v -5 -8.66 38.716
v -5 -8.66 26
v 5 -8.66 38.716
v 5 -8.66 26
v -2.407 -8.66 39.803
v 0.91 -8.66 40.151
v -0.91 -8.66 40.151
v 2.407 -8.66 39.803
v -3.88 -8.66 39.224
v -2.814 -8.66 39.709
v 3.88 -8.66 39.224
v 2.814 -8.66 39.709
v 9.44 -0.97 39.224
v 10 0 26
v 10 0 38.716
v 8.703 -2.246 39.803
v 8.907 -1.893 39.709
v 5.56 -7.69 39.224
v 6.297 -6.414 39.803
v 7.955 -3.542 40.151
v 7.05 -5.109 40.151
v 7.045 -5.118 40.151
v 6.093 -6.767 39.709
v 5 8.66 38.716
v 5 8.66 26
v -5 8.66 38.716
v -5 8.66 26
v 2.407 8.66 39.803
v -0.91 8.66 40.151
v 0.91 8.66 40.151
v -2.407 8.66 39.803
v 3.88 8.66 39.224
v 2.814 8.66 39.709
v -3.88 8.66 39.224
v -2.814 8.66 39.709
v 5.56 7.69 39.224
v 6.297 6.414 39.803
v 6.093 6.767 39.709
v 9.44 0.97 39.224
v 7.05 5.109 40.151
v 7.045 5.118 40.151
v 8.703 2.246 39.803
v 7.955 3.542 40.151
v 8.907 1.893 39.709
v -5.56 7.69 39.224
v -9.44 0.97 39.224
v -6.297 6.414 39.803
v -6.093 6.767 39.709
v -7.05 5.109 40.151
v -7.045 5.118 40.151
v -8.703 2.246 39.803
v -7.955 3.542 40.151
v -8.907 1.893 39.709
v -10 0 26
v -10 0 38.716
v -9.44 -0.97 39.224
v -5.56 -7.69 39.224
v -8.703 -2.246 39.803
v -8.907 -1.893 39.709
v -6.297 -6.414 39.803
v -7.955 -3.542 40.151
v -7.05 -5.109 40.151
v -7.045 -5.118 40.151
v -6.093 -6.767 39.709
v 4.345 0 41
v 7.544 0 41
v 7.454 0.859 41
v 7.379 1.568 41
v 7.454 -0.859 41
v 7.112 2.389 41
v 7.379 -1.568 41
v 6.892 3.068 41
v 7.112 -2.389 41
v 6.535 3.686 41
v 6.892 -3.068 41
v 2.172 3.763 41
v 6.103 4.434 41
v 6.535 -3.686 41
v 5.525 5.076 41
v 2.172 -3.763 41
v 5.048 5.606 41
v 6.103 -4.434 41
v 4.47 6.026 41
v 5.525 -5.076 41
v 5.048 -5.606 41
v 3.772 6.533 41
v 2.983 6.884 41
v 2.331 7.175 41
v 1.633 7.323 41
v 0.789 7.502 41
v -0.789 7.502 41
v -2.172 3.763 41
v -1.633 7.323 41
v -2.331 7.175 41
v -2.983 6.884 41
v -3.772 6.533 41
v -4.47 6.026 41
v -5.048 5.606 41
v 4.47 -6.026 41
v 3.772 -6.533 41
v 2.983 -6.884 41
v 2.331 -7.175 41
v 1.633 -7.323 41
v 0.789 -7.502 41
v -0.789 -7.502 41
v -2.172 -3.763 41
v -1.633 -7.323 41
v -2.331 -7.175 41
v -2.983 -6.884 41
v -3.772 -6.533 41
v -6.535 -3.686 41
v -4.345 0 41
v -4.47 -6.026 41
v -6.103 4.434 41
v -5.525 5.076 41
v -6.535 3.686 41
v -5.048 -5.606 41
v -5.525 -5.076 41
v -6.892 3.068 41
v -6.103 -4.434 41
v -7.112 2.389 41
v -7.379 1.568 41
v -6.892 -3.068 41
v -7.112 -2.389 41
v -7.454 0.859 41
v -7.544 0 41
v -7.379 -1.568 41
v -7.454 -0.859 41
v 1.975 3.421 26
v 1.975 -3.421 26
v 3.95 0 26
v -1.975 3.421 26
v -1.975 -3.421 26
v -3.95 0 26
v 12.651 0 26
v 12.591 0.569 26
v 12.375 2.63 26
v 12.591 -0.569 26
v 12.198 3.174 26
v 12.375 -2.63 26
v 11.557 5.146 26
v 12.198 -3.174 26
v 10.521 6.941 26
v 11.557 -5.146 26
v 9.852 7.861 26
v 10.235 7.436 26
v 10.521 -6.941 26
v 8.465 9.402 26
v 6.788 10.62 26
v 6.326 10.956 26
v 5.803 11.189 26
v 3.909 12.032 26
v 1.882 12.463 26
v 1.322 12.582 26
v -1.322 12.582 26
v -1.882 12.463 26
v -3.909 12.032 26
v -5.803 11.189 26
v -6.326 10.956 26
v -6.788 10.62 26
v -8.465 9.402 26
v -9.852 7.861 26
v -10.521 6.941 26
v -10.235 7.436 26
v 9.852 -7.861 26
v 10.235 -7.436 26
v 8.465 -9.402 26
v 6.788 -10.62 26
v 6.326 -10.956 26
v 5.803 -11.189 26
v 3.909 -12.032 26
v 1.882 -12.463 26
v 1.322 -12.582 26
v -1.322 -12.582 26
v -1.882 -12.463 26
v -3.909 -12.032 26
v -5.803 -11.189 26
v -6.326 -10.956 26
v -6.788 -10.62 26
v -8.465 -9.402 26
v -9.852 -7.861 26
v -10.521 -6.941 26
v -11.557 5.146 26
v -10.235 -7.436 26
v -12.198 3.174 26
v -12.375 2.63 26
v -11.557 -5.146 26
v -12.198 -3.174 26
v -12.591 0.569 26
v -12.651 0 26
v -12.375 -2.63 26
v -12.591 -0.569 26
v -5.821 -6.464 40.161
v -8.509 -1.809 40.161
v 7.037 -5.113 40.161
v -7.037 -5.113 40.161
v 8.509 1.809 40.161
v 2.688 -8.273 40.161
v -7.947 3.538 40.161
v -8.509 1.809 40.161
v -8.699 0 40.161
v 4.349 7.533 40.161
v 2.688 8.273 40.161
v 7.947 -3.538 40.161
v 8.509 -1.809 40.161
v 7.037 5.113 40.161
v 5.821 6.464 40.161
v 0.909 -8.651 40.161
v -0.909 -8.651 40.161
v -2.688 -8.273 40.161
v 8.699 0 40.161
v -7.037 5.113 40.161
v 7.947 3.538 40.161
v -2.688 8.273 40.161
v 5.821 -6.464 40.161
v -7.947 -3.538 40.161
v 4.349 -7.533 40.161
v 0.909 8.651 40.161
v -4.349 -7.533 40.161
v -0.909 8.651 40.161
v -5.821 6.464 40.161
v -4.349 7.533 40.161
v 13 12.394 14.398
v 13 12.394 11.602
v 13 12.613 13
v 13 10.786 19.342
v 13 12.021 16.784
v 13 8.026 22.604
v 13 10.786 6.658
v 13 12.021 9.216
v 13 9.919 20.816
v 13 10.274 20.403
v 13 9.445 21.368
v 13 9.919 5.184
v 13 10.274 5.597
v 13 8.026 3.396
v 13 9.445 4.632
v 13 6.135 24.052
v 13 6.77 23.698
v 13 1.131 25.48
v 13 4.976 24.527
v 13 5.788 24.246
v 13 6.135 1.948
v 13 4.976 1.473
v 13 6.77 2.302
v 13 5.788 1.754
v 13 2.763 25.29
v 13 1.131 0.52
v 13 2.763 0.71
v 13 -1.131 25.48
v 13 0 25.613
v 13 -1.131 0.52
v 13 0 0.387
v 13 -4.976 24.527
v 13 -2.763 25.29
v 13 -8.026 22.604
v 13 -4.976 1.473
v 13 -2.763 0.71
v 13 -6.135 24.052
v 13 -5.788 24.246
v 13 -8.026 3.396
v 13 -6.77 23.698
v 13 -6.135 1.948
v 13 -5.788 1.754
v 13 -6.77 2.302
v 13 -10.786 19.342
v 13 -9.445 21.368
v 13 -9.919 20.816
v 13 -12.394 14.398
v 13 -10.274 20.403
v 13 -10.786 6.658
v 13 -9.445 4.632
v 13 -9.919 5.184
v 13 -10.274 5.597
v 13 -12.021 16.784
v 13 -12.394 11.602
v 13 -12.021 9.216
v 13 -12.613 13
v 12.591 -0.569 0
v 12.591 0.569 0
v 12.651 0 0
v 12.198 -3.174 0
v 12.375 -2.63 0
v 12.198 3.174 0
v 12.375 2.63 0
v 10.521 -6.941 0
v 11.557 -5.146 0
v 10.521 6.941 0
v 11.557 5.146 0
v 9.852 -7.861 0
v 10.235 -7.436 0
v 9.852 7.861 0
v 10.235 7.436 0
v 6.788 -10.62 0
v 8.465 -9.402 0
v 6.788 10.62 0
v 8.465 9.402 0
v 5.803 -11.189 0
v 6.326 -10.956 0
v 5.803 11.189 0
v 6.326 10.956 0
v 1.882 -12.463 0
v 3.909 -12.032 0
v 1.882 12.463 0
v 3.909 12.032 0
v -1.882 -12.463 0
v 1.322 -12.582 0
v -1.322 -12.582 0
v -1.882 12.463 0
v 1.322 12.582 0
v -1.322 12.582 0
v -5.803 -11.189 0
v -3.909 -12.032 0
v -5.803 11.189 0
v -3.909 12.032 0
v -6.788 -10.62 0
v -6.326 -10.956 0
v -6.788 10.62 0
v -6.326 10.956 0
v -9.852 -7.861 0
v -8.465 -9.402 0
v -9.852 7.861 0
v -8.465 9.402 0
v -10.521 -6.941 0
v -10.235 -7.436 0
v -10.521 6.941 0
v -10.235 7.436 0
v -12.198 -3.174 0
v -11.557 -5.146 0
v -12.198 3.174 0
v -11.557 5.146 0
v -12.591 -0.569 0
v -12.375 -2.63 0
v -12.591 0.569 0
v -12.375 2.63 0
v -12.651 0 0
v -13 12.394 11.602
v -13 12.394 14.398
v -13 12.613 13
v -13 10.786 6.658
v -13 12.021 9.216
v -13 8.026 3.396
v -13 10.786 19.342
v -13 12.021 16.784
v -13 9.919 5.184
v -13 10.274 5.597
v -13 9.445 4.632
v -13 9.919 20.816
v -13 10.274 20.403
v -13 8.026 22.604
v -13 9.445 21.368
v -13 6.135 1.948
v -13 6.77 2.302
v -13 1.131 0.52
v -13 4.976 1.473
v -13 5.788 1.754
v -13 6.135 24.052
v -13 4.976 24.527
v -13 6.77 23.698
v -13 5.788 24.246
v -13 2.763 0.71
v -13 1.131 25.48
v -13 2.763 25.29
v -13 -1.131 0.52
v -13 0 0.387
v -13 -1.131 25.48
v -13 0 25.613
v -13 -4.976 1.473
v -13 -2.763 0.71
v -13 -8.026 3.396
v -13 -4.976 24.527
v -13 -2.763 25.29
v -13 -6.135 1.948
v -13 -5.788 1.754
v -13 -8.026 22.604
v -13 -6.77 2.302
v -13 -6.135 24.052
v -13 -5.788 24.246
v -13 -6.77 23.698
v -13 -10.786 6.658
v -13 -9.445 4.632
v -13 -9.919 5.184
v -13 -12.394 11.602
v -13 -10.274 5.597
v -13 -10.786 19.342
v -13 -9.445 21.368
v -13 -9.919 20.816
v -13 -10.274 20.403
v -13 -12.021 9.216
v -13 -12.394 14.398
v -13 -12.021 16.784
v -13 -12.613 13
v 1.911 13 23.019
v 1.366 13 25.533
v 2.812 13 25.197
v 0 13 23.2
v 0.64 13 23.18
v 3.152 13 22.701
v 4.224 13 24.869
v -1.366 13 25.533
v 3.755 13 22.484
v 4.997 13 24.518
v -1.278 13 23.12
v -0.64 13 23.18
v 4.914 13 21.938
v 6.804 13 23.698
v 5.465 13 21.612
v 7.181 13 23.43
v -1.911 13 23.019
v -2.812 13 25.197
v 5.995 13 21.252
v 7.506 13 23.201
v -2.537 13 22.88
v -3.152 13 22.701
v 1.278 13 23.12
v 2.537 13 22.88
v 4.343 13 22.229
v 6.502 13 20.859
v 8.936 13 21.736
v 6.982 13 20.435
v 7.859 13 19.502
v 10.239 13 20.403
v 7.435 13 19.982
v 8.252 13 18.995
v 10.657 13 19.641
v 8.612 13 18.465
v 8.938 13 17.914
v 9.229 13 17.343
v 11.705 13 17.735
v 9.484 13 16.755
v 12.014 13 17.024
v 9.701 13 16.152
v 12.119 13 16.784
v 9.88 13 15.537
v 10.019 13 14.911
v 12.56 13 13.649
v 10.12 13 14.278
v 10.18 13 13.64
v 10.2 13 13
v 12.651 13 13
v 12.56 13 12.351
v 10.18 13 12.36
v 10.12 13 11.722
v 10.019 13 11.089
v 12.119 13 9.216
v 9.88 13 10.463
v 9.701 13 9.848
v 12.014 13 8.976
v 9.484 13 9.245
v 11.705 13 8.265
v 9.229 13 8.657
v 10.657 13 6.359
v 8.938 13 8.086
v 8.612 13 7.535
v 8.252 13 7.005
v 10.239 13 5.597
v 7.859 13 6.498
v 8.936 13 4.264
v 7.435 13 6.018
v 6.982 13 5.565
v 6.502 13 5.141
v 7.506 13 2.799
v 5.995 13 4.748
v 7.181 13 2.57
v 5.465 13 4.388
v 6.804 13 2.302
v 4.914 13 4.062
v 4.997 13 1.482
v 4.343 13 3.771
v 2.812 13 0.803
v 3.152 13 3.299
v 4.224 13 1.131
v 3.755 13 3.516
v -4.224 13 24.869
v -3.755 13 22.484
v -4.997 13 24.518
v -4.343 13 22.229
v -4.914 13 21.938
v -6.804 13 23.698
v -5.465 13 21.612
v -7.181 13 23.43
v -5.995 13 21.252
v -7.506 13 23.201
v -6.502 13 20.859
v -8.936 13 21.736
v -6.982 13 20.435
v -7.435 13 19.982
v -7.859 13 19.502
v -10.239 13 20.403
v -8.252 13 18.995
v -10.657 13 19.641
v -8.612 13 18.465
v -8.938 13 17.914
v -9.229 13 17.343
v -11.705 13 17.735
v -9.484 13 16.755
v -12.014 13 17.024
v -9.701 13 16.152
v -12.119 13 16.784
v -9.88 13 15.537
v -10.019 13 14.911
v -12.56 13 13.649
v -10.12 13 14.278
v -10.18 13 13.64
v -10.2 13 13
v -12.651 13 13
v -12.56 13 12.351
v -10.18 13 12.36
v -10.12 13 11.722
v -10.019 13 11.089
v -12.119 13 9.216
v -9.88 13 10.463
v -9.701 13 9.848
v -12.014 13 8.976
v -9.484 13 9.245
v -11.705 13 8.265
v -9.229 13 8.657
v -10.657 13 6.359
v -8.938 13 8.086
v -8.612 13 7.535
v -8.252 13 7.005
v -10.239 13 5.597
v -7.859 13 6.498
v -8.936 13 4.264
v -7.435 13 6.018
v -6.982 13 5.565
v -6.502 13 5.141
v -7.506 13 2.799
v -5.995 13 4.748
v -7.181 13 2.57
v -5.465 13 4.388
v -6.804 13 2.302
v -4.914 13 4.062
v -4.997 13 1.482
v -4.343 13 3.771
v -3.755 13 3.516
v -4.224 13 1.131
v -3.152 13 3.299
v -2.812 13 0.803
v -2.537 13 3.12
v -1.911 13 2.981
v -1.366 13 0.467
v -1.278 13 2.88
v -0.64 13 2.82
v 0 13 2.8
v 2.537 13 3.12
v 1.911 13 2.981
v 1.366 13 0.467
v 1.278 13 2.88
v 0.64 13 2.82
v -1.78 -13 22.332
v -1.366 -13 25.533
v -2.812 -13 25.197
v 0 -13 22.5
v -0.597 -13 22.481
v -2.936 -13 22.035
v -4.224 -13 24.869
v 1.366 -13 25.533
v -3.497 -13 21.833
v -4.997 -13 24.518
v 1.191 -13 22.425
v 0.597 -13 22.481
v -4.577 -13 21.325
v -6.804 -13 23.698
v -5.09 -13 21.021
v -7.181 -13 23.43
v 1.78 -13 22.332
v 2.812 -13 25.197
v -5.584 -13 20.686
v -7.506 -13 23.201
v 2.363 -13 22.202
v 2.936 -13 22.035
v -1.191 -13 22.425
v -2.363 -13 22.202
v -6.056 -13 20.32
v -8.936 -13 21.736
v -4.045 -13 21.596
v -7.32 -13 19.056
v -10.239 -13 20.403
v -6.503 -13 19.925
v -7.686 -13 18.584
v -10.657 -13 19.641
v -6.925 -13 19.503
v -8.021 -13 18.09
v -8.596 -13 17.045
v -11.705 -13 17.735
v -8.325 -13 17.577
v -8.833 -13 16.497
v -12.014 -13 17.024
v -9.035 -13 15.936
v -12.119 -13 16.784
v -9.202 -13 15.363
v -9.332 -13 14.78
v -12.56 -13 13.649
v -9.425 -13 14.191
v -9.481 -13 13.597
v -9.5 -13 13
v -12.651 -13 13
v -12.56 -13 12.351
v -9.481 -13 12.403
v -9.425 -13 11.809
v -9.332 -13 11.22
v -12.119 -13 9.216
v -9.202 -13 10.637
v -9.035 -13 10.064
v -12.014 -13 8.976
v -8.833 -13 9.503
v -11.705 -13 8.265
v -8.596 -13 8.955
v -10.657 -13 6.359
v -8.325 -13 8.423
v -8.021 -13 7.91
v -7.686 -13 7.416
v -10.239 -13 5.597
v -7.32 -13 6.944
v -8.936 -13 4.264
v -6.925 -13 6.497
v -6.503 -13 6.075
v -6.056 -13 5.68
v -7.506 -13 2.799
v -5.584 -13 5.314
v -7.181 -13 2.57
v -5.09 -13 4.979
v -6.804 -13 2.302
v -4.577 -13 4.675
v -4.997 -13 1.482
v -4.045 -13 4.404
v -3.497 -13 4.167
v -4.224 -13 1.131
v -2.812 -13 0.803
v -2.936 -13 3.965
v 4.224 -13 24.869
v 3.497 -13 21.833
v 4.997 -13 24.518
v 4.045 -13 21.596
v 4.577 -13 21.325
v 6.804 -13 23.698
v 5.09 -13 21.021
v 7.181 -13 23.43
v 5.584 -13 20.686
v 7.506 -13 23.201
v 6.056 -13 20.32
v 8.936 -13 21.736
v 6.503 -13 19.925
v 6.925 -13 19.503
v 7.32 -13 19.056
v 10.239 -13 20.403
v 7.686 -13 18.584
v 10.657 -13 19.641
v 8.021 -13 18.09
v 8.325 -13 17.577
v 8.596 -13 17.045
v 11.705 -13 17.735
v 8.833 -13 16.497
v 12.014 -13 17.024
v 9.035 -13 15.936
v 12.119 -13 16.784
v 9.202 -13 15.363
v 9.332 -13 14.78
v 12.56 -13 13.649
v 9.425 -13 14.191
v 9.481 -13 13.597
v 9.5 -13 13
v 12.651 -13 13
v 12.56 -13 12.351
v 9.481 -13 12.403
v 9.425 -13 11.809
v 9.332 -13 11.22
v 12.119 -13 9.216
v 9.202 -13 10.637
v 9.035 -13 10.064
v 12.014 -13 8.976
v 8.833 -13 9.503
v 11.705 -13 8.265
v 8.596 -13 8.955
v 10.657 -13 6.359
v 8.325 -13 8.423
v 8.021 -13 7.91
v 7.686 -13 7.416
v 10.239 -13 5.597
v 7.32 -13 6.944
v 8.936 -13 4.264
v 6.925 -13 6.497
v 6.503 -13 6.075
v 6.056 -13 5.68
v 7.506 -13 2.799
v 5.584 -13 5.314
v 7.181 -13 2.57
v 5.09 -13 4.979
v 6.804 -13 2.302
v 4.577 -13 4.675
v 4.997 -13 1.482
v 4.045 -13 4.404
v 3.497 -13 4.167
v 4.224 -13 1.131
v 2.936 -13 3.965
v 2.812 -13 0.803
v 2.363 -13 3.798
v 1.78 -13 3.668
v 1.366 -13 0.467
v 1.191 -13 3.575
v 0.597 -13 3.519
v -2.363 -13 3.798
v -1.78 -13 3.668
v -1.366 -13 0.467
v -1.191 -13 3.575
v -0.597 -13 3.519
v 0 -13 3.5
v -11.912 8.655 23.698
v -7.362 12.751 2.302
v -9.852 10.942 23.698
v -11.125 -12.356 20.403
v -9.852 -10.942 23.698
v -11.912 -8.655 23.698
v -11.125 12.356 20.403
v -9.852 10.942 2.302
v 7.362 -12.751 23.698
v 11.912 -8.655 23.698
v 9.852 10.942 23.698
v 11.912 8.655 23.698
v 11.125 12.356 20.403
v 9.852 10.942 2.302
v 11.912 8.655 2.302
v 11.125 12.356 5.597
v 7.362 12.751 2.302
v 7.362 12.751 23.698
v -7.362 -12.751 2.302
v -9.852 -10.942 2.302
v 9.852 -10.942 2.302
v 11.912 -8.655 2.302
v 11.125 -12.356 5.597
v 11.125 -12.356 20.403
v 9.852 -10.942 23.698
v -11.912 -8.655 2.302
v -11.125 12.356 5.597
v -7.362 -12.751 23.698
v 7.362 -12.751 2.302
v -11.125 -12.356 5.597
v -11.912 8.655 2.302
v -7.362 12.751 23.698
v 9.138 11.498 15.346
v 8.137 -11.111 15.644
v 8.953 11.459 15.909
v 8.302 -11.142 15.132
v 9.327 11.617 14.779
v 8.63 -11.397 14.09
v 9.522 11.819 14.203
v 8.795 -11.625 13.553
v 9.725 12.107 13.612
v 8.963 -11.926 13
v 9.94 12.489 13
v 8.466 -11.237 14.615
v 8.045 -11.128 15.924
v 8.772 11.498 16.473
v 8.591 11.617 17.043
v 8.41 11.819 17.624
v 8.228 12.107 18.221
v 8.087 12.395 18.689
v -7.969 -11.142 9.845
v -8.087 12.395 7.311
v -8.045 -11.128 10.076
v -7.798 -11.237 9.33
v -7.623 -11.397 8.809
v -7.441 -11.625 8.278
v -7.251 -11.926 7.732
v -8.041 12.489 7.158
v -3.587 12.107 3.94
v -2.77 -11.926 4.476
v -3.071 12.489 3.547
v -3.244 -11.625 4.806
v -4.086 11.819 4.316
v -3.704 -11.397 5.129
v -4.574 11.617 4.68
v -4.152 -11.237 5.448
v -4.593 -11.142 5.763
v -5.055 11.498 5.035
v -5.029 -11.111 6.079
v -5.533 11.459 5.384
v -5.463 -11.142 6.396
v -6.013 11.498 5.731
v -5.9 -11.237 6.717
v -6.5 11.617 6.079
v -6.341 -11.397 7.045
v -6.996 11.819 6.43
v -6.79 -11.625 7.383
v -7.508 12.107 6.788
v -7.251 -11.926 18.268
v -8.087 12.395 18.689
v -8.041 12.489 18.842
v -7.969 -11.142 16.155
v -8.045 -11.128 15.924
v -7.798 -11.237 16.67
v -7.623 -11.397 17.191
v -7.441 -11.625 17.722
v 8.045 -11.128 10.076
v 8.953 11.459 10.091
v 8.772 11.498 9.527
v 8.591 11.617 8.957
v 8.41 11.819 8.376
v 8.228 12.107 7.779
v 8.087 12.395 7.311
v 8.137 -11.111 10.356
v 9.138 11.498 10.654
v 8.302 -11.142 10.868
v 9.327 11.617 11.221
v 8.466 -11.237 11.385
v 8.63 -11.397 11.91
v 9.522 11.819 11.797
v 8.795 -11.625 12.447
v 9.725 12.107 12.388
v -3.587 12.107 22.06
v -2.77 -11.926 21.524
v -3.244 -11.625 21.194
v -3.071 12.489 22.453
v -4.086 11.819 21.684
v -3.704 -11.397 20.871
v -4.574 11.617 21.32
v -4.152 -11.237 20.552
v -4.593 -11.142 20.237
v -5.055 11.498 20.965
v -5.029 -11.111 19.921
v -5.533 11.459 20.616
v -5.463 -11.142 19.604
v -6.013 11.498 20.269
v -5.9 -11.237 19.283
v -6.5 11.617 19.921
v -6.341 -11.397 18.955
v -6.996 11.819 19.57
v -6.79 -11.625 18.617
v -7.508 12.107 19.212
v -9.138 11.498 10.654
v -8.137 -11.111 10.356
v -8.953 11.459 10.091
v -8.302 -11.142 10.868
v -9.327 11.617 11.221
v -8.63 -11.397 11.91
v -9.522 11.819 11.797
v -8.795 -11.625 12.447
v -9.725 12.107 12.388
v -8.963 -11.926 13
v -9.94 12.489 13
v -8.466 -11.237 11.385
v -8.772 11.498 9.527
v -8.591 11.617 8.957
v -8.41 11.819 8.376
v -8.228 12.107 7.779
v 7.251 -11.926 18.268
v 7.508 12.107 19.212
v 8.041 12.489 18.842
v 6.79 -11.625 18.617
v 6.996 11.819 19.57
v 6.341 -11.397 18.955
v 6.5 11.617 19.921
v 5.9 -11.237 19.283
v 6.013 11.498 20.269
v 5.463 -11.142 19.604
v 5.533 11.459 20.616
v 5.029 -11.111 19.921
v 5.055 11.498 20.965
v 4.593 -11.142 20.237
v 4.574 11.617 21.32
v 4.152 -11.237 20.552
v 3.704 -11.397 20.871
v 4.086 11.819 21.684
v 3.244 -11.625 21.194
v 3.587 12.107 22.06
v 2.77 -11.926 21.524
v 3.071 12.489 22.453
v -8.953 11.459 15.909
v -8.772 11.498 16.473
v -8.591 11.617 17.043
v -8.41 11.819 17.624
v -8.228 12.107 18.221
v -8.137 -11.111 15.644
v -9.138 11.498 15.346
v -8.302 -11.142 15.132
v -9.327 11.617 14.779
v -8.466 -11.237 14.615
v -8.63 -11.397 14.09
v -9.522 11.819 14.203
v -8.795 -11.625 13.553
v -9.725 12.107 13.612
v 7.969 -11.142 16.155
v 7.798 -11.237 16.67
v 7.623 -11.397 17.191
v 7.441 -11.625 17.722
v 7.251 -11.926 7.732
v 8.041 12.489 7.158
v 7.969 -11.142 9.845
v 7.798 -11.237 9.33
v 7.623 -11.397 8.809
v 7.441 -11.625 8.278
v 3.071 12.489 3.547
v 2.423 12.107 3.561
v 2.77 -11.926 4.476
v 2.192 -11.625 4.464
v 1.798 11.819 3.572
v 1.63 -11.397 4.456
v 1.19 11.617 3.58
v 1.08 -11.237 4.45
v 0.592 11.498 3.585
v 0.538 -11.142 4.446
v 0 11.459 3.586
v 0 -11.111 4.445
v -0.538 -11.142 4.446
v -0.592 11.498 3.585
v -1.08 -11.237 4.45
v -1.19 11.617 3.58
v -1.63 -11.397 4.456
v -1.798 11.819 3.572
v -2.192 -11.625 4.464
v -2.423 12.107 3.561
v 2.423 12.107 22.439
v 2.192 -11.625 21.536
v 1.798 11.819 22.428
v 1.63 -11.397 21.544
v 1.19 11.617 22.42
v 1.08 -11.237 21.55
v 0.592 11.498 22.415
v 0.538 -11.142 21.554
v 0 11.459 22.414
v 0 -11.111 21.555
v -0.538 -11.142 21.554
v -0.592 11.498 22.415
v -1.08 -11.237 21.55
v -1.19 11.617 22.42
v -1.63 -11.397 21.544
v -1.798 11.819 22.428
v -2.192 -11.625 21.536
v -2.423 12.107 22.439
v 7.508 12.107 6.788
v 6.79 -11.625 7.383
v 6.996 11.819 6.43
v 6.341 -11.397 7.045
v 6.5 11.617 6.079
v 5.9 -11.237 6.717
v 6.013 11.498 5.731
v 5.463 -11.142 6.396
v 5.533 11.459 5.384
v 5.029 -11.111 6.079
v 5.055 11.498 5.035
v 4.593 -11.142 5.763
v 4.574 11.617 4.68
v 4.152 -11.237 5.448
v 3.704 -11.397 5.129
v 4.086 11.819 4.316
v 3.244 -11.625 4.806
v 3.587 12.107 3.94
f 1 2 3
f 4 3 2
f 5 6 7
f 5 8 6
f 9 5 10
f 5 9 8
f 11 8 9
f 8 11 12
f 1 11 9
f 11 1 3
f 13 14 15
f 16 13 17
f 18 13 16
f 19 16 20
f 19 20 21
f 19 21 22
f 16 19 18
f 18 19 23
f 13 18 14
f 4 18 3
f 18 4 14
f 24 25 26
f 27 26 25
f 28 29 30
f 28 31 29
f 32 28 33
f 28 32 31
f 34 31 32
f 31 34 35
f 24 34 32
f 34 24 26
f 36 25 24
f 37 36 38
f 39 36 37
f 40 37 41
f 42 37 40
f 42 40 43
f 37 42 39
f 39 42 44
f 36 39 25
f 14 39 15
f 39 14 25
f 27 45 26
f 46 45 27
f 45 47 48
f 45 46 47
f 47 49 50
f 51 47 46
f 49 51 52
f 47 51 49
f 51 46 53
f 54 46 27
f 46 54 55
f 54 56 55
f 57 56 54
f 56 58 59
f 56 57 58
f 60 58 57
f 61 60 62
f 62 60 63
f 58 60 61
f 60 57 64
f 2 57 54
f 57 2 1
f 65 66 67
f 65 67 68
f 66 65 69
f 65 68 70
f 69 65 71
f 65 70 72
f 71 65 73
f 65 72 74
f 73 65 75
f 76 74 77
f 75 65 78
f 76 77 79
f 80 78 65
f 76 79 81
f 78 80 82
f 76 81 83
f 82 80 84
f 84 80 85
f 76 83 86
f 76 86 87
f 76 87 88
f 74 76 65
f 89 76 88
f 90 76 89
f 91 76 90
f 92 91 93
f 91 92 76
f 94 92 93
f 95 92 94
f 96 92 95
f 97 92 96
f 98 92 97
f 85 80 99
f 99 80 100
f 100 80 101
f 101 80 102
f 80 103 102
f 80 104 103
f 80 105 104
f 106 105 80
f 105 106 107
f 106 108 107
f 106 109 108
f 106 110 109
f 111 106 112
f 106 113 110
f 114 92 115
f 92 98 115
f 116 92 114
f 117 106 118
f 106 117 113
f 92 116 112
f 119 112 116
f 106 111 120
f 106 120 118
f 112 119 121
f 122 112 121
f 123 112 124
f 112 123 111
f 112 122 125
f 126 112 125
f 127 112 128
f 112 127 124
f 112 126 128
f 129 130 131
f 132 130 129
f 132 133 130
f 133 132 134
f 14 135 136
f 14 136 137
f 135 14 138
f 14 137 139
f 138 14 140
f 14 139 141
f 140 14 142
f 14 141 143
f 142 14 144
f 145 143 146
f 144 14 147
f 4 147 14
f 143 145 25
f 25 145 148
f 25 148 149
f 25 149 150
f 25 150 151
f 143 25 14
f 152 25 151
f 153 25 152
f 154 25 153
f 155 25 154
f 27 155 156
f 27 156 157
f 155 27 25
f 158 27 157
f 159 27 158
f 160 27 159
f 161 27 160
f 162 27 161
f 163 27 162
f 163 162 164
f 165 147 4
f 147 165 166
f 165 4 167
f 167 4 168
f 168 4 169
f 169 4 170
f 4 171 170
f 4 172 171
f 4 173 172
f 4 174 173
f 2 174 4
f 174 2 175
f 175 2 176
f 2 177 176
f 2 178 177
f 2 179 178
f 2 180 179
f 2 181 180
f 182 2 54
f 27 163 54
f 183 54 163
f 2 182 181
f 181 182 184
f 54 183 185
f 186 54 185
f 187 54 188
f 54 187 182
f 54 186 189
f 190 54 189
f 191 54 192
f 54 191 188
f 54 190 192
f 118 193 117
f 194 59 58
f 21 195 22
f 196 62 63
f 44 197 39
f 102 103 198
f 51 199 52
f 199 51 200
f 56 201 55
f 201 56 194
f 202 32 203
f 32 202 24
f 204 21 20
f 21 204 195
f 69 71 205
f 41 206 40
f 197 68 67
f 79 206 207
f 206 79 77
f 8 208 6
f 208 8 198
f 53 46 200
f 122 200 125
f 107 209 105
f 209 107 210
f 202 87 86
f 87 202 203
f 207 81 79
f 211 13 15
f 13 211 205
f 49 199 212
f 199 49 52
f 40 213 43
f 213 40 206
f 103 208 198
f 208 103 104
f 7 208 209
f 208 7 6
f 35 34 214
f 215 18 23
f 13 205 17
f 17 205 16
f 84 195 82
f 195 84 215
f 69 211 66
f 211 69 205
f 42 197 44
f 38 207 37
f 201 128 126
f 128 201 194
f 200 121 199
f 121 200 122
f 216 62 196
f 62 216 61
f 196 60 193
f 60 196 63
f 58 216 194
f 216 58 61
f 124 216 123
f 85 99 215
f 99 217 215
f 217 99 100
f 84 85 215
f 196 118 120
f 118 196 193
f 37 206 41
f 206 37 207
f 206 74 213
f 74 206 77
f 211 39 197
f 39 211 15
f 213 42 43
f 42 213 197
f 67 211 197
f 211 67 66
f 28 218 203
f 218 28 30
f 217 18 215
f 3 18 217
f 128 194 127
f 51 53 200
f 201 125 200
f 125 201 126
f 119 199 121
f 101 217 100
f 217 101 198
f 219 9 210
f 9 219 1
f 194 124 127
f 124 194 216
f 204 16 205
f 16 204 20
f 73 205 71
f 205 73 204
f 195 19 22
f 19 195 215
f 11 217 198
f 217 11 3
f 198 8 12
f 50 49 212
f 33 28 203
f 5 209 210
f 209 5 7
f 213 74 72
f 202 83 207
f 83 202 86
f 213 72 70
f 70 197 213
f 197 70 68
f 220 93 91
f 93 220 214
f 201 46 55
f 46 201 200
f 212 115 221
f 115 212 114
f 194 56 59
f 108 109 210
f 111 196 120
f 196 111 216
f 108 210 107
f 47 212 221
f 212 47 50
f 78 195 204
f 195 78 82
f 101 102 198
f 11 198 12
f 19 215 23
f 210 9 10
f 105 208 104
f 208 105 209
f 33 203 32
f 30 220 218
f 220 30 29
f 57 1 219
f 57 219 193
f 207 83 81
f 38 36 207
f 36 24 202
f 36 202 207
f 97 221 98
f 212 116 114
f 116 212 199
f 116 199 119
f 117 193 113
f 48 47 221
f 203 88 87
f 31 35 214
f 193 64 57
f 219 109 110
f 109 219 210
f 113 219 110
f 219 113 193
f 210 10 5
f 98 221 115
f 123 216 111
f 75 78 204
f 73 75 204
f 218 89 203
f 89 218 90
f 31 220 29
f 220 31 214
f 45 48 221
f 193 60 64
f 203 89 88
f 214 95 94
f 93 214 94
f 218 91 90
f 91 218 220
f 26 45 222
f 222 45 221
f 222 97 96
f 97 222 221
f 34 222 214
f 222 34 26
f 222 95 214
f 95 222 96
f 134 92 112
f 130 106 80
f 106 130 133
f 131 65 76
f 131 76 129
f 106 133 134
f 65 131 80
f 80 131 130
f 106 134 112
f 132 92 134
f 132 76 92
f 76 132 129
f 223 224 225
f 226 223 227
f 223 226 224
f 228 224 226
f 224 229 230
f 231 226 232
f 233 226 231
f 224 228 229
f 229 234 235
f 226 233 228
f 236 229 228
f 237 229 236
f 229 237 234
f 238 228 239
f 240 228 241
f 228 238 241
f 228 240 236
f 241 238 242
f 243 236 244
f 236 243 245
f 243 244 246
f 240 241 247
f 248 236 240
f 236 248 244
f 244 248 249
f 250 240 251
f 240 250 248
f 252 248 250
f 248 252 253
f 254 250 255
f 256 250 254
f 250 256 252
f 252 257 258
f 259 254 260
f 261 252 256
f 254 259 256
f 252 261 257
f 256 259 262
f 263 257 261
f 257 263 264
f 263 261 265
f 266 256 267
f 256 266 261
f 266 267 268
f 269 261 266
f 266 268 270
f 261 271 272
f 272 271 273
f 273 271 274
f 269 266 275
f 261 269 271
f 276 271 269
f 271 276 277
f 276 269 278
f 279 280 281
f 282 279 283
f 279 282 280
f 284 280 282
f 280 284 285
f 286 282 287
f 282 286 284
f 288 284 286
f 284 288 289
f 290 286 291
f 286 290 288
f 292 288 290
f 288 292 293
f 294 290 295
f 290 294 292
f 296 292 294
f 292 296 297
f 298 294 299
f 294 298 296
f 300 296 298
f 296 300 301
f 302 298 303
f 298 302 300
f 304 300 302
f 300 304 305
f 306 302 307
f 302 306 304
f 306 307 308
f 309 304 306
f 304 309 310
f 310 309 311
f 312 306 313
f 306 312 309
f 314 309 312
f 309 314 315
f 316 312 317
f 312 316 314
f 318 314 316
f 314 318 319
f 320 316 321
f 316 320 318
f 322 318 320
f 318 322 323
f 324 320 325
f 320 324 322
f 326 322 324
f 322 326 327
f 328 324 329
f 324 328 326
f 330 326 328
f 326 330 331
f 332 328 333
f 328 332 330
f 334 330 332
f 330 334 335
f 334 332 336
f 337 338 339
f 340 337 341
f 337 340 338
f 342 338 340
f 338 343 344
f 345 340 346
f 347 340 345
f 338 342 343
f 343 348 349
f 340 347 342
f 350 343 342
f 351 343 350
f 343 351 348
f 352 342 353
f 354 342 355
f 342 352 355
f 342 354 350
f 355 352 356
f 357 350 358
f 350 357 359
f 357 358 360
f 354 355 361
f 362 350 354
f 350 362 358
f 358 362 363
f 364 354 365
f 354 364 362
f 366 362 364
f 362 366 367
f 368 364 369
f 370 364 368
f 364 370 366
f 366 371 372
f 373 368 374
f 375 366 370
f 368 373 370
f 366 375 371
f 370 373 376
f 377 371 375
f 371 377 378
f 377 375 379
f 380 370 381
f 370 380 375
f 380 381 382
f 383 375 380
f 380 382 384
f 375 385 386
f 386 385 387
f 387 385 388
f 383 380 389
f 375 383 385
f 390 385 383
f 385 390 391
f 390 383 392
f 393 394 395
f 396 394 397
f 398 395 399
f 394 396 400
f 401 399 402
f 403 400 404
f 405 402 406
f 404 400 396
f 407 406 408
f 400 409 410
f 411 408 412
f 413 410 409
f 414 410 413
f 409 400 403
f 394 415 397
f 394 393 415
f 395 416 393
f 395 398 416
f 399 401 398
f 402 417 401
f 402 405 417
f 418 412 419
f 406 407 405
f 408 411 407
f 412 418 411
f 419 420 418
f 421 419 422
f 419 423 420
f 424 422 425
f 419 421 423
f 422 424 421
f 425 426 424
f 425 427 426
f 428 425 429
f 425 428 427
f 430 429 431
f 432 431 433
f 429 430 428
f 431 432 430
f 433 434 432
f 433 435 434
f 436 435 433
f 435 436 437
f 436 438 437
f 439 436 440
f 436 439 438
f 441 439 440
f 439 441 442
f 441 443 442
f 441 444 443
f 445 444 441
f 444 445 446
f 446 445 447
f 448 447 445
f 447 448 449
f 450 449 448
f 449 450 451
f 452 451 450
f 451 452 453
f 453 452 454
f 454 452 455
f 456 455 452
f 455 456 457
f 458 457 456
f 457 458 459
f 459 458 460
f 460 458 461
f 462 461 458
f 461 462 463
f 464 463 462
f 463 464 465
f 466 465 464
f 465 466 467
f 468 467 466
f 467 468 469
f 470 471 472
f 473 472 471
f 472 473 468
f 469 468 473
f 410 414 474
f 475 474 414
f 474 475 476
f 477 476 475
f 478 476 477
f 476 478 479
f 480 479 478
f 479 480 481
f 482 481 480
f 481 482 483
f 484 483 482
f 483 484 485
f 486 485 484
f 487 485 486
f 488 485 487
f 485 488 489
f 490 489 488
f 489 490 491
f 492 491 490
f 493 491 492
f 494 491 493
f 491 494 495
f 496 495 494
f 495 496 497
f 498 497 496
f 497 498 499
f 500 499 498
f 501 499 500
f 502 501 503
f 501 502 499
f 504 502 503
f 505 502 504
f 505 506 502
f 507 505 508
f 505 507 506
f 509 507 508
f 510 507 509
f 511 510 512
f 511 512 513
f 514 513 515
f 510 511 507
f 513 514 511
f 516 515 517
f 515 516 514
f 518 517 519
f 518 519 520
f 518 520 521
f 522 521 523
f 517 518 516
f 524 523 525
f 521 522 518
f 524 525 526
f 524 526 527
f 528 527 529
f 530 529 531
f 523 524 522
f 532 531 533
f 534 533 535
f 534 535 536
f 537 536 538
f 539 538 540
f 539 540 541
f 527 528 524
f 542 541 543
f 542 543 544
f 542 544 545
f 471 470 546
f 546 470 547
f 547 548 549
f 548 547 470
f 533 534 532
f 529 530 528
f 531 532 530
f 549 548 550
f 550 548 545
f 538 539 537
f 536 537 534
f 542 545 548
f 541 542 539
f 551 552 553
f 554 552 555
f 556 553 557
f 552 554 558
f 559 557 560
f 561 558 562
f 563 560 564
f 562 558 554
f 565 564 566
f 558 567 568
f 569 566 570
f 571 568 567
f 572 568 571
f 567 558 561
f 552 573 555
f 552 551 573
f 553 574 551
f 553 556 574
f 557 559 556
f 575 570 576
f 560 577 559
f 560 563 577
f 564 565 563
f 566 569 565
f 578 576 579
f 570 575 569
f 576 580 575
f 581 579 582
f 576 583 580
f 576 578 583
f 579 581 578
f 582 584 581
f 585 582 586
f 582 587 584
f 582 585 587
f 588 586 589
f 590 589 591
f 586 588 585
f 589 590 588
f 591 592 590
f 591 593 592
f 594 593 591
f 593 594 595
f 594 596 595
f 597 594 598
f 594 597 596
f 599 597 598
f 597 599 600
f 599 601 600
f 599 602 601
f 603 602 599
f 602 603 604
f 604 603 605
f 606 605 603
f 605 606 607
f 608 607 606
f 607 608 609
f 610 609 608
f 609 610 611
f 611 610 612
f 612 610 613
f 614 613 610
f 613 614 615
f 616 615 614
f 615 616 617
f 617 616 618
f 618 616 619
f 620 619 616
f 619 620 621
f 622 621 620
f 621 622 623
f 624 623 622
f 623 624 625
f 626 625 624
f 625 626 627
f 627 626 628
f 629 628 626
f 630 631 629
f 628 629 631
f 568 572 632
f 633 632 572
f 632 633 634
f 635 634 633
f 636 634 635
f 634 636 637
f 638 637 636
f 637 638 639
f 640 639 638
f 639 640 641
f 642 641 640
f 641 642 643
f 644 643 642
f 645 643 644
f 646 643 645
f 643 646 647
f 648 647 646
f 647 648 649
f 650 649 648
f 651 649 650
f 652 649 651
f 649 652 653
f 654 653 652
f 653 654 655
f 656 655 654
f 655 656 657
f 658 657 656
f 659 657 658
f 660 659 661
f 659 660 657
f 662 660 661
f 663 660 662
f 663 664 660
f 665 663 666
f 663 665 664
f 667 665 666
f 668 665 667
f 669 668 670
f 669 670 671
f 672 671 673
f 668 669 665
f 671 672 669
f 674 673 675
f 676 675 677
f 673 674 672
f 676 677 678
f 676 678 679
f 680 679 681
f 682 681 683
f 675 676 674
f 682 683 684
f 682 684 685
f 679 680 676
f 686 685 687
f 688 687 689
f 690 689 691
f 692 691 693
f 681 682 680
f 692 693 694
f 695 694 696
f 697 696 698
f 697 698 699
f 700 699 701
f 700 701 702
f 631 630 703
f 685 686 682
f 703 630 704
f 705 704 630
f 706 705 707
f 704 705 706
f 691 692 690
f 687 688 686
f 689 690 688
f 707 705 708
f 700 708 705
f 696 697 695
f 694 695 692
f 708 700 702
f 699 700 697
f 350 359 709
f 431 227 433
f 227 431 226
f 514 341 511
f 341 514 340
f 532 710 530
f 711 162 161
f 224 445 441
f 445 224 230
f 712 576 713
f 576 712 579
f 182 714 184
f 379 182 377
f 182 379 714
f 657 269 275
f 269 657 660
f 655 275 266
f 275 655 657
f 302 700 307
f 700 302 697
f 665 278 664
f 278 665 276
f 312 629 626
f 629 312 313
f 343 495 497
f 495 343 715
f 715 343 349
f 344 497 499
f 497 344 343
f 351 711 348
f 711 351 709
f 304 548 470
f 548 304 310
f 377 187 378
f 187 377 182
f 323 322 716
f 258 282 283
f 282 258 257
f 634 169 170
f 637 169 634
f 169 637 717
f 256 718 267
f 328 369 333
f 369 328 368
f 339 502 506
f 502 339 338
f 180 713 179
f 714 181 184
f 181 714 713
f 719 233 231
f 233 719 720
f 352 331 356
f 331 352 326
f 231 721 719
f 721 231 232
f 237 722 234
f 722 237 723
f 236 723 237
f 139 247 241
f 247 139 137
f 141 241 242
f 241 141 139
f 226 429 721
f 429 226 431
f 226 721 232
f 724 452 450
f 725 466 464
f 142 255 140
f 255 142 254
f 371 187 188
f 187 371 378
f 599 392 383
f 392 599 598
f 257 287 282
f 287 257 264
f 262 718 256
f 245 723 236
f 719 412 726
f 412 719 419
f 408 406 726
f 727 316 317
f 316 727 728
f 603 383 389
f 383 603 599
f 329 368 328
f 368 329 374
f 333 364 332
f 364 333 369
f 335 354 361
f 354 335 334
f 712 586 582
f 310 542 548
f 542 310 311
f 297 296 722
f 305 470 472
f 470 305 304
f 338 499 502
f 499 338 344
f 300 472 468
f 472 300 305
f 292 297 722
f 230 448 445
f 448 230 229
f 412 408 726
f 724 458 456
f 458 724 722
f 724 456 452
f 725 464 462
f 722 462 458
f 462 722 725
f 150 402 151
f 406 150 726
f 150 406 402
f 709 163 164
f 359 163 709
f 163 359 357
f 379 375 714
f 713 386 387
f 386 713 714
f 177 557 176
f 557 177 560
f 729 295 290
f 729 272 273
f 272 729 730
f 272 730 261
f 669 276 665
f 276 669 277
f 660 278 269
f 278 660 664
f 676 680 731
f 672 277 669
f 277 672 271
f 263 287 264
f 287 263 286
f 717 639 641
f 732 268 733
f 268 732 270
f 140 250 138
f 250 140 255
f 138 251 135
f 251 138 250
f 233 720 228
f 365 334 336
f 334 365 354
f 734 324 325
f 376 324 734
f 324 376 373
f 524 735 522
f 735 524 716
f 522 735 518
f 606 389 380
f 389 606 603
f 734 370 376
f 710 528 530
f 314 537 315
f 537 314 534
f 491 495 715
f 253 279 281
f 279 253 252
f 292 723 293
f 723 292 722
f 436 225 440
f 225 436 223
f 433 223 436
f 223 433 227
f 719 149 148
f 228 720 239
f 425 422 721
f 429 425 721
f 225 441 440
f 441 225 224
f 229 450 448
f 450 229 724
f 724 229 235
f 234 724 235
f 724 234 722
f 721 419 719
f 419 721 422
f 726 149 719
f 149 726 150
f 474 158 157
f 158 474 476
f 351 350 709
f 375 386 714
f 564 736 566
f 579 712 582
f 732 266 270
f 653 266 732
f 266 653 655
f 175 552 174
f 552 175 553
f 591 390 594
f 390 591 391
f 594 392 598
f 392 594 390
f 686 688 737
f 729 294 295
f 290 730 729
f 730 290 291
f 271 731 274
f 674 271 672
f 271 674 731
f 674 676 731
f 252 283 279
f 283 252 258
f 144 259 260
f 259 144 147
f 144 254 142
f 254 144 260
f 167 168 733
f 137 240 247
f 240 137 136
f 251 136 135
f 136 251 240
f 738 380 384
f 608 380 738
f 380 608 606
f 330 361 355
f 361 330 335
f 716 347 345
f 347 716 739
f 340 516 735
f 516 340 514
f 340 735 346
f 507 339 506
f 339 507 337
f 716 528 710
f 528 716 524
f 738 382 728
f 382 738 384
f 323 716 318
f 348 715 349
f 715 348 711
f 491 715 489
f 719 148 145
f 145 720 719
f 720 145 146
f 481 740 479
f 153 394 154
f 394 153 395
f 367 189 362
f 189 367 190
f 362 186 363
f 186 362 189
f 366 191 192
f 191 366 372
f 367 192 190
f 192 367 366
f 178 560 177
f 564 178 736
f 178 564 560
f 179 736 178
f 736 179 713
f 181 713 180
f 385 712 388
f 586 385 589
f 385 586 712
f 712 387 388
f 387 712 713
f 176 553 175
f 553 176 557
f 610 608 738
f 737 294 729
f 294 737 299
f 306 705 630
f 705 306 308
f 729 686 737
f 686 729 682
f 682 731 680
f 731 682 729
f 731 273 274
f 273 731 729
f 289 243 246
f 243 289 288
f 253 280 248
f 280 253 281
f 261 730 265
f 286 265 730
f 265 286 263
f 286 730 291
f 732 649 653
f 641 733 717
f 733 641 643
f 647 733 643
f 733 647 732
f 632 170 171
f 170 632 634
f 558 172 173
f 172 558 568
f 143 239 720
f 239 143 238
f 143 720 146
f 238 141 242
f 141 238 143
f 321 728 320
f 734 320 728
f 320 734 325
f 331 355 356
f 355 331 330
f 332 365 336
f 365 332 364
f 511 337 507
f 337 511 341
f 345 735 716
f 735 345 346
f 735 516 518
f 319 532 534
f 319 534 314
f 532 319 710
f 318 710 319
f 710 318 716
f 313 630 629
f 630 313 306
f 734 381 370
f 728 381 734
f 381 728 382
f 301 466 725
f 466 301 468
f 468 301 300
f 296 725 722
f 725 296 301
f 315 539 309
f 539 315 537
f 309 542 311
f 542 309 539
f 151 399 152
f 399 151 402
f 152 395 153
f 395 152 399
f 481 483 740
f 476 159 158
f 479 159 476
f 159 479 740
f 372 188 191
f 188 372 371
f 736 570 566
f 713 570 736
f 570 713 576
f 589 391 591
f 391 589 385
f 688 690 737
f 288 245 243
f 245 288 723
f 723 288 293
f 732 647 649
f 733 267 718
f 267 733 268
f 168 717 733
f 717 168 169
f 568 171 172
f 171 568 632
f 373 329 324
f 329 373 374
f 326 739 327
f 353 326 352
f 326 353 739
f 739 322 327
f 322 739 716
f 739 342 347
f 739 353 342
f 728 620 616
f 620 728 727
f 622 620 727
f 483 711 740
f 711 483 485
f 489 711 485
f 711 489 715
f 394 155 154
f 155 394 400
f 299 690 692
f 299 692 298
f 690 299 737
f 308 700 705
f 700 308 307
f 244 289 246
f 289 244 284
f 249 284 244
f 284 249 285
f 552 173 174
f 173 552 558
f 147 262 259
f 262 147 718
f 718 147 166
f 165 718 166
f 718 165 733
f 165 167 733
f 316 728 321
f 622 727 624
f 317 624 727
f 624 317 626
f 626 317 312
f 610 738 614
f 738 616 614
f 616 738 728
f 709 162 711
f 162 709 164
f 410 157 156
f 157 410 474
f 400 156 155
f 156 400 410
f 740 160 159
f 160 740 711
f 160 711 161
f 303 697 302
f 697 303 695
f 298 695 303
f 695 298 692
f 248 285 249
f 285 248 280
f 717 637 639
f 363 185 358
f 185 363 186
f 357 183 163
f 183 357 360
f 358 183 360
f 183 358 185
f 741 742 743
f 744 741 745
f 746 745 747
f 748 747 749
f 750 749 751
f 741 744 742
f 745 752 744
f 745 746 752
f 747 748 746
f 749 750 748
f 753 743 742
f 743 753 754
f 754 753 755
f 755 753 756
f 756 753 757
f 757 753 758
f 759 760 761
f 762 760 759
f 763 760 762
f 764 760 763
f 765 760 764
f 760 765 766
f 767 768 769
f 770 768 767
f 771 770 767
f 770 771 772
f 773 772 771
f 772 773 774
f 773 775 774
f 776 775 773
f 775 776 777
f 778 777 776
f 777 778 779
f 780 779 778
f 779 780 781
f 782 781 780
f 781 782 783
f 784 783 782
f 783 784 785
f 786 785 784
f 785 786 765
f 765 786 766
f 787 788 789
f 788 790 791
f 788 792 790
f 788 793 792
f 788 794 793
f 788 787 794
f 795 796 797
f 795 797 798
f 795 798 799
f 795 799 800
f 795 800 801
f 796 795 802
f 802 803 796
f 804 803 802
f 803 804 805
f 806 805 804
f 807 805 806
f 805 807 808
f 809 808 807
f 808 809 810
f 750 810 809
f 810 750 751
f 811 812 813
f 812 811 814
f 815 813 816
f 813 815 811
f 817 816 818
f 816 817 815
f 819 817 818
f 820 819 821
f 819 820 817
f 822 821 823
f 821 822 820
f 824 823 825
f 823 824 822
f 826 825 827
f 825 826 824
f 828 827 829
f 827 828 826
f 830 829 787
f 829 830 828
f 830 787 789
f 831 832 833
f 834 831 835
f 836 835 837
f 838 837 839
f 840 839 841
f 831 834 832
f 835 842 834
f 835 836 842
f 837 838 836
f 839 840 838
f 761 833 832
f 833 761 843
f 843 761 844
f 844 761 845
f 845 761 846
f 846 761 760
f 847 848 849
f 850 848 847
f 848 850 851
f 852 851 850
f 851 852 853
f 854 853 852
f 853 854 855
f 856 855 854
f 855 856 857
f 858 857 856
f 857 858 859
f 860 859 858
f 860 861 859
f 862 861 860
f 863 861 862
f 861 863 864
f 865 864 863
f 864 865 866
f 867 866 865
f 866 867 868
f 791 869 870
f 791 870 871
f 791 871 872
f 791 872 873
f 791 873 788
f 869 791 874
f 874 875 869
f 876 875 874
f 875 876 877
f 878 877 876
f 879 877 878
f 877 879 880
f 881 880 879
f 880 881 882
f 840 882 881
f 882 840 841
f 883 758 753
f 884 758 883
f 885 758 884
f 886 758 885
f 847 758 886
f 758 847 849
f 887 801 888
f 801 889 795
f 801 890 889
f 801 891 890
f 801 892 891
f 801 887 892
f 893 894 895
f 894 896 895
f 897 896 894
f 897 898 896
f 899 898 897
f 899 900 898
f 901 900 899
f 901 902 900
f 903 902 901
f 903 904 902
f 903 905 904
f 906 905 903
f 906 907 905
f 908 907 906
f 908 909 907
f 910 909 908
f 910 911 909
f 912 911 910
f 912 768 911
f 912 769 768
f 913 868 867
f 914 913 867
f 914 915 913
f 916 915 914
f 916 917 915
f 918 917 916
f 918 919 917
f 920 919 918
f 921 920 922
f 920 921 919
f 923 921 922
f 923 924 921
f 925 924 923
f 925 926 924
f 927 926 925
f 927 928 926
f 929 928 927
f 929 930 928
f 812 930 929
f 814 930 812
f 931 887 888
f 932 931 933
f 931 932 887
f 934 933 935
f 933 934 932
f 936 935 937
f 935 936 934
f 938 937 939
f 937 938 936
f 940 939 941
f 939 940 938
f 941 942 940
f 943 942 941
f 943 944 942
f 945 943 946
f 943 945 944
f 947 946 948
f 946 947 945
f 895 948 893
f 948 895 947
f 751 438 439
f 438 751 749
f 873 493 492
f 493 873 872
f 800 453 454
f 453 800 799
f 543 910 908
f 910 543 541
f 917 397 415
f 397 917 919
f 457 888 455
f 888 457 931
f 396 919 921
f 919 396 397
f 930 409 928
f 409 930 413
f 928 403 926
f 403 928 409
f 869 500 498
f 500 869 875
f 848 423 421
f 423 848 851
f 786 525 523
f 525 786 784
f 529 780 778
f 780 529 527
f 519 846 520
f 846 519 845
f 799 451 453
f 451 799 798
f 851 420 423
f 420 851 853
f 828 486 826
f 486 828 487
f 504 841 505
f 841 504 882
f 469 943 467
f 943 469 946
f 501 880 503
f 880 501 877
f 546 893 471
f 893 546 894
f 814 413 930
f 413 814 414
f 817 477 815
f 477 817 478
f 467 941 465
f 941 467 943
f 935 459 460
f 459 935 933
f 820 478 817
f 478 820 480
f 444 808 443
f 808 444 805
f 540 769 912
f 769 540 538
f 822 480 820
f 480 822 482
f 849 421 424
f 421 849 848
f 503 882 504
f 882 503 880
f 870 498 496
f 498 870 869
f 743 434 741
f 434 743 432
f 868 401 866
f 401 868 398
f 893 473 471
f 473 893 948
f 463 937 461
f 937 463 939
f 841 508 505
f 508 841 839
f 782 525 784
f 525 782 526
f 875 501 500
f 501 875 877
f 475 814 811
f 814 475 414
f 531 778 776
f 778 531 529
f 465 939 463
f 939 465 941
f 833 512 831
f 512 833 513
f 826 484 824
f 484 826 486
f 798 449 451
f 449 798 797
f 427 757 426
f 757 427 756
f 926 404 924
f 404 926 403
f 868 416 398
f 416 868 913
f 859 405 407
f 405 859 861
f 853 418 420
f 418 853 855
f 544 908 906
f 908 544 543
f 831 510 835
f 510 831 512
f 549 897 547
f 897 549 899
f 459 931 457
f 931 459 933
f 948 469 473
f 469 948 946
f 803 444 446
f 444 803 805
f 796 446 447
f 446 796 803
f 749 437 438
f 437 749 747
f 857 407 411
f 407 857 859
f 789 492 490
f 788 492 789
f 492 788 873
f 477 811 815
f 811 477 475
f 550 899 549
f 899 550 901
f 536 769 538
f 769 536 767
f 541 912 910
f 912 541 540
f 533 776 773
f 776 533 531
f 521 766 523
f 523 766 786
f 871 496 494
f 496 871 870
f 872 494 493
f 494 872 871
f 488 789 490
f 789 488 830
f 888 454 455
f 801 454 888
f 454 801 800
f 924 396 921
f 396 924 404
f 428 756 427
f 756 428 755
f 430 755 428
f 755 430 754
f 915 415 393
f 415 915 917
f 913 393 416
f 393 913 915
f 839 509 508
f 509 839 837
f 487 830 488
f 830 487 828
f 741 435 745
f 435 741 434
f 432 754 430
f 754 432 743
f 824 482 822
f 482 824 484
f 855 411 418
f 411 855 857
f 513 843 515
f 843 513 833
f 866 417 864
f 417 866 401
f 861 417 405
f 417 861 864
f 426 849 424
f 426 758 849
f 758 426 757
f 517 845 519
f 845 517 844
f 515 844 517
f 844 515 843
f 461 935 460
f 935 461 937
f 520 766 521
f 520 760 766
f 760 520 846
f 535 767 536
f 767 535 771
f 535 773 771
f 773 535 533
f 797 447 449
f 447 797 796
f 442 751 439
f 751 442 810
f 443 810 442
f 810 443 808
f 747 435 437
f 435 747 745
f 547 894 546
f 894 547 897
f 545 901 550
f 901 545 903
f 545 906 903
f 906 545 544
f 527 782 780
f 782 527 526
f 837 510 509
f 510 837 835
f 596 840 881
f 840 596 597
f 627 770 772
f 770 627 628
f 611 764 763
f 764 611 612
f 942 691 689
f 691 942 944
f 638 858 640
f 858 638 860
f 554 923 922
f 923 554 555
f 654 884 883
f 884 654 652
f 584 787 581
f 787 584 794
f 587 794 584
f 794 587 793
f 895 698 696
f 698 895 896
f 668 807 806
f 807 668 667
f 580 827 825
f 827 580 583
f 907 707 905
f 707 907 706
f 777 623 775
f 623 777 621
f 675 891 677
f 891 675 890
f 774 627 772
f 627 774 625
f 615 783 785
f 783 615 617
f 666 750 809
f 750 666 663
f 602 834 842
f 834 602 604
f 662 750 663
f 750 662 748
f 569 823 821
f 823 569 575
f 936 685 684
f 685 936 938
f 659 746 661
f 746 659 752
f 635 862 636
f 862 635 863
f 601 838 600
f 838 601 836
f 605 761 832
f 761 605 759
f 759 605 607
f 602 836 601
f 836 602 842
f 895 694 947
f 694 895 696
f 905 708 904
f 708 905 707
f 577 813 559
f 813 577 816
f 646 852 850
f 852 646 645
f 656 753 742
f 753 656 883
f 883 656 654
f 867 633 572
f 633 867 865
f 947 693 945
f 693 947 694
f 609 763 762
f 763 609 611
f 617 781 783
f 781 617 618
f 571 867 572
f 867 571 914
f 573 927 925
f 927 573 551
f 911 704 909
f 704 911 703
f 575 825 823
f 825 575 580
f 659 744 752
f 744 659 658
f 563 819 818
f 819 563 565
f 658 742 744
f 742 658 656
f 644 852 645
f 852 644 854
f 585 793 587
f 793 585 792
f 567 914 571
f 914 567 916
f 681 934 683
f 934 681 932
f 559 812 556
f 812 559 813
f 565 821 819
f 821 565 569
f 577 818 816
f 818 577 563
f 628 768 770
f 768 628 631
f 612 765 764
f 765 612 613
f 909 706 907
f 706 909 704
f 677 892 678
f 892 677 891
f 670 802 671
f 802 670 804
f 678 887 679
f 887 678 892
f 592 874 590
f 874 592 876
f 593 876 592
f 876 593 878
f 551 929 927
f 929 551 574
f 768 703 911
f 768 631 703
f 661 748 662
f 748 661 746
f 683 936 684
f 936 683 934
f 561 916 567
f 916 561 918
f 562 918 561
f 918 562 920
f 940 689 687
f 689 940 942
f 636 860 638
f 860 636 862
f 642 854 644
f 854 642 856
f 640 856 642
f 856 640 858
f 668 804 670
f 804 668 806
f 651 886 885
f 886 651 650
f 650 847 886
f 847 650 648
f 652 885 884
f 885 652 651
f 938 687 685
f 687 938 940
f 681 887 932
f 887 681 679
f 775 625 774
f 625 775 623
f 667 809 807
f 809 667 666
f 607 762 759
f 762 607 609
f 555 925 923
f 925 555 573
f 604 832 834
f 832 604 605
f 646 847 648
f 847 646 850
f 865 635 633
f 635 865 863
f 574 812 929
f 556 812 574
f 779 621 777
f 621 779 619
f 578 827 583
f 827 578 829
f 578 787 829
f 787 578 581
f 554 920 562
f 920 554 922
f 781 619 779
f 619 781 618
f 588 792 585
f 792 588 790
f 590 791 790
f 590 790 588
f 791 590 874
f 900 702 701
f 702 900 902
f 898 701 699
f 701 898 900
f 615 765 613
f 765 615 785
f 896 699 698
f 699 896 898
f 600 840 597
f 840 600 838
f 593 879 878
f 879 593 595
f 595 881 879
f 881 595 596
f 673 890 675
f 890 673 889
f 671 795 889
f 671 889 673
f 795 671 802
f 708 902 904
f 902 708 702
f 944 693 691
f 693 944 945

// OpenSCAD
od=26;  //od = handle outside dimension mm
ir=10;  //ir =finger hole radius mm



module hex(r=15,h=10){
intersection() {
    cylinder(r=r,h, $fn=6);
    translate([0,0,h*.5-3])
    sphere(r*1.3);
}
}

module hex_hole(id=7.9,h=20,od=10){
//id=size of hex bit   
//tapered hole with 1.1 tmes taper    
difference(){
 hex(od/2,h);
 translate([0,0,0])
cylinder(r1=id/2,r2=id/2*1.1,h, $fn=6); 
    }
}

//id is the hex bit dimension
module mini_handle(id=7.9,h=15,od=20){
translate([0,0,od/2]){
    union(){
translate([0,0,od*.5])
hex_hole(id,h,od=20);
intersection() {
    cube(od, center=true);
    sphere(od*.7);
    }
   }
  }
}

module finger_driver(od=26,ir=10){
//od = handle outside dimension mm
//ir =finger hole radius mm
difference(){
mini_handle(od=od);  
translate([0,od/2+1,od/2]) rotate([90,0,0])
cylinder(r1=ir,r2=ir*.8, 50, $fn=10);
    
translate([0,od/2,od/2]) rotate([90,0,0])
    cylinder(r1=ir*1.02,r2=0, 20, $fn=100);
translate([0,-od/2-1,od/2]) rotate([90,0,180])
    cylinder(r1=ir,r2=0, 20, $fn=100);
}
}

//
//od = handle outside dimension mm
//ir =finger hole radius mm
finger_driver(od,ir);
